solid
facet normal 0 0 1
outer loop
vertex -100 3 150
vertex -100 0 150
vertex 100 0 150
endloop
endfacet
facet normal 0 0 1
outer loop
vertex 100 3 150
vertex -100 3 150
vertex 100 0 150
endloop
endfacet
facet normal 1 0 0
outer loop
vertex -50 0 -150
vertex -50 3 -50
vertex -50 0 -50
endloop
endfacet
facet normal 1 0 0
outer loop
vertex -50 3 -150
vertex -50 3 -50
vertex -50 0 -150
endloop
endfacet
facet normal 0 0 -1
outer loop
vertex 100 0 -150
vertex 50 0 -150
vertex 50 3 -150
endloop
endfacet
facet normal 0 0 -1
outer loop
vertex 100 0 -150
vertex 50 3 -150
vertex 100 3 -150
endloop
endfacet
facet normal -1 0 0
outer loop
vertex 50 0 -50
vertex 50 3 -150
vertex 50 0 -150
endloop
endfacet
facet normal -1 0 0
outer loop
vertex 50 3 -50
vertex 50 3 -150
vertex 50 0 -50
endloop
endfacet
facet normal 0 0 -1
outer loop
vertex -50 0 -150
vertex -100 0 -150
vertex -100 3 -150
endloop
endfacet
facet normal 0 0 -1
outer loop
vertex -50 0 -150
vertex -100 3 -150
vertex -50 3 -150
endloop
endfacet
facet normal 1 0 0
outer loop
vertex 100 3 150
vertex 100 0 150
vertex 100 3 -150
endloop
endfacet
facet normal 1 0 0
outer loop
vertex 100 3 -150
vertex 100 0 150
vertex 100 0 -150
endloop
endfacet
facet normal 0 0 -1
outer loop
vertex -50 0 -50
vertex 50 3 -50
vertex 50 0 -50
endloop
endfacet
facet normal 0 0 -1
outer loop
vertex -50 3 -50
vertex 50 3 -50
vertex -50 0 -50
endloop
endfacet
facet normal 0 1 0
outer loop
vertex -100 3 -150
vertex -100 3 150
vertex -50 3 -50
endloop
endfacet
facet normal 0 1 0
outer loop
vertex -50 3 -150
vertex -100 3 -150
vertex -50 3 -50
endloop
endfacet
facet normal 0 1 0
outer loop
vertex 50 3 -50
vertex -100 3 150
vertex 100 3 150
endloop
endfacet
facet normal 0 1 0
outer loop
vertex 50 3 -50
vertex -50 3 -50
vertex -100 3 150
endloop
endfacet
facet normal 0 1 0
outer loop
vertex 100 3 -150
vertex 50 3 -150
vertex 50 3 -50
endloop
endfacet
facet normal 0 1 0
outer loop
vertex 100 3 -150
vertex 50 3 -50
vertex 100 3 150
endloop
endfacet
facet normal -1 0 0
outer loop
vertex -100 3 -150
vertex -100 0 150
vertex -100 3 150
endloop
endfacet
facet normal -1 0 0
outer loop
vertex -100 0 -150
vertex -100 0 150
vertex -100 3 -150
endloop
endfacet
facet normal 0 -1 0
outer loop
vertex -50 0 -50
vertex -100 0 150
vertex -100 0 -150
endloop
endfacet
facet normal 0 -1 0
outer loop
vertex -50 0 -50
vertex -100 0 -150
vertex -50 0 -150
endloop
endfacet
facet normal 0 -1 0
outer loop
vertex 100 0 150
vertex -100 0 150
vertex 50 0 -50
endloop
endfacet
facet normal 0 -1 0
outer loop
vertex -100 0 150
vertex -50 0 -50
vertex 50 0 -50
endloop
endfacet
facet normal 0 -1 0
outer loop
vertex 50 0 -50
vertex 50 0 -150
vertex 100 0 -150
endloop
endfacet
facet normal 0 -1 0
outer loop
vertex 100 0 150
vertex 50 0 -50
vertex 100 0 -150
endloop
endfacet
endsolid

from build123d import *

# Parameters (mm, degrees)
SKETCH1_W           = 200
SKETCH1_H           = 300
BOSS_EXTRUDE1_DEPTH = 3
CUT_EXTRUDE1_DEPTH  = 181.302523554


with BuildPart() as part:
    # Sketch1 → Boss-Extrude1 (new body)
    with BuildSketch(Plane(origin=(0, 0, 0), x_dir=(1, 0, 0), z_dir=(0, 1, 0))):
        Rectangle(SKETCH1_W, SKETCH1_H)
    extrude(amount=BOSS_EXTRUDE1_DEPTH)

    # Sketch3 → Cut-Extrude1 (cut, through all)
    with BuildSketch(Plane(origin=(0, 3, 0), x_dir=(1, 0, 0), z_dir=(0, 1, 0))):
        Polygon((0, 150), (50, 150), (50, 50), (-50, 50), (-50, 150), align=None)
    extrude(amount=-CUT_EXTRUDE1_DEPTH, mode=Mode.SUBTRACT)


solid = part.part
